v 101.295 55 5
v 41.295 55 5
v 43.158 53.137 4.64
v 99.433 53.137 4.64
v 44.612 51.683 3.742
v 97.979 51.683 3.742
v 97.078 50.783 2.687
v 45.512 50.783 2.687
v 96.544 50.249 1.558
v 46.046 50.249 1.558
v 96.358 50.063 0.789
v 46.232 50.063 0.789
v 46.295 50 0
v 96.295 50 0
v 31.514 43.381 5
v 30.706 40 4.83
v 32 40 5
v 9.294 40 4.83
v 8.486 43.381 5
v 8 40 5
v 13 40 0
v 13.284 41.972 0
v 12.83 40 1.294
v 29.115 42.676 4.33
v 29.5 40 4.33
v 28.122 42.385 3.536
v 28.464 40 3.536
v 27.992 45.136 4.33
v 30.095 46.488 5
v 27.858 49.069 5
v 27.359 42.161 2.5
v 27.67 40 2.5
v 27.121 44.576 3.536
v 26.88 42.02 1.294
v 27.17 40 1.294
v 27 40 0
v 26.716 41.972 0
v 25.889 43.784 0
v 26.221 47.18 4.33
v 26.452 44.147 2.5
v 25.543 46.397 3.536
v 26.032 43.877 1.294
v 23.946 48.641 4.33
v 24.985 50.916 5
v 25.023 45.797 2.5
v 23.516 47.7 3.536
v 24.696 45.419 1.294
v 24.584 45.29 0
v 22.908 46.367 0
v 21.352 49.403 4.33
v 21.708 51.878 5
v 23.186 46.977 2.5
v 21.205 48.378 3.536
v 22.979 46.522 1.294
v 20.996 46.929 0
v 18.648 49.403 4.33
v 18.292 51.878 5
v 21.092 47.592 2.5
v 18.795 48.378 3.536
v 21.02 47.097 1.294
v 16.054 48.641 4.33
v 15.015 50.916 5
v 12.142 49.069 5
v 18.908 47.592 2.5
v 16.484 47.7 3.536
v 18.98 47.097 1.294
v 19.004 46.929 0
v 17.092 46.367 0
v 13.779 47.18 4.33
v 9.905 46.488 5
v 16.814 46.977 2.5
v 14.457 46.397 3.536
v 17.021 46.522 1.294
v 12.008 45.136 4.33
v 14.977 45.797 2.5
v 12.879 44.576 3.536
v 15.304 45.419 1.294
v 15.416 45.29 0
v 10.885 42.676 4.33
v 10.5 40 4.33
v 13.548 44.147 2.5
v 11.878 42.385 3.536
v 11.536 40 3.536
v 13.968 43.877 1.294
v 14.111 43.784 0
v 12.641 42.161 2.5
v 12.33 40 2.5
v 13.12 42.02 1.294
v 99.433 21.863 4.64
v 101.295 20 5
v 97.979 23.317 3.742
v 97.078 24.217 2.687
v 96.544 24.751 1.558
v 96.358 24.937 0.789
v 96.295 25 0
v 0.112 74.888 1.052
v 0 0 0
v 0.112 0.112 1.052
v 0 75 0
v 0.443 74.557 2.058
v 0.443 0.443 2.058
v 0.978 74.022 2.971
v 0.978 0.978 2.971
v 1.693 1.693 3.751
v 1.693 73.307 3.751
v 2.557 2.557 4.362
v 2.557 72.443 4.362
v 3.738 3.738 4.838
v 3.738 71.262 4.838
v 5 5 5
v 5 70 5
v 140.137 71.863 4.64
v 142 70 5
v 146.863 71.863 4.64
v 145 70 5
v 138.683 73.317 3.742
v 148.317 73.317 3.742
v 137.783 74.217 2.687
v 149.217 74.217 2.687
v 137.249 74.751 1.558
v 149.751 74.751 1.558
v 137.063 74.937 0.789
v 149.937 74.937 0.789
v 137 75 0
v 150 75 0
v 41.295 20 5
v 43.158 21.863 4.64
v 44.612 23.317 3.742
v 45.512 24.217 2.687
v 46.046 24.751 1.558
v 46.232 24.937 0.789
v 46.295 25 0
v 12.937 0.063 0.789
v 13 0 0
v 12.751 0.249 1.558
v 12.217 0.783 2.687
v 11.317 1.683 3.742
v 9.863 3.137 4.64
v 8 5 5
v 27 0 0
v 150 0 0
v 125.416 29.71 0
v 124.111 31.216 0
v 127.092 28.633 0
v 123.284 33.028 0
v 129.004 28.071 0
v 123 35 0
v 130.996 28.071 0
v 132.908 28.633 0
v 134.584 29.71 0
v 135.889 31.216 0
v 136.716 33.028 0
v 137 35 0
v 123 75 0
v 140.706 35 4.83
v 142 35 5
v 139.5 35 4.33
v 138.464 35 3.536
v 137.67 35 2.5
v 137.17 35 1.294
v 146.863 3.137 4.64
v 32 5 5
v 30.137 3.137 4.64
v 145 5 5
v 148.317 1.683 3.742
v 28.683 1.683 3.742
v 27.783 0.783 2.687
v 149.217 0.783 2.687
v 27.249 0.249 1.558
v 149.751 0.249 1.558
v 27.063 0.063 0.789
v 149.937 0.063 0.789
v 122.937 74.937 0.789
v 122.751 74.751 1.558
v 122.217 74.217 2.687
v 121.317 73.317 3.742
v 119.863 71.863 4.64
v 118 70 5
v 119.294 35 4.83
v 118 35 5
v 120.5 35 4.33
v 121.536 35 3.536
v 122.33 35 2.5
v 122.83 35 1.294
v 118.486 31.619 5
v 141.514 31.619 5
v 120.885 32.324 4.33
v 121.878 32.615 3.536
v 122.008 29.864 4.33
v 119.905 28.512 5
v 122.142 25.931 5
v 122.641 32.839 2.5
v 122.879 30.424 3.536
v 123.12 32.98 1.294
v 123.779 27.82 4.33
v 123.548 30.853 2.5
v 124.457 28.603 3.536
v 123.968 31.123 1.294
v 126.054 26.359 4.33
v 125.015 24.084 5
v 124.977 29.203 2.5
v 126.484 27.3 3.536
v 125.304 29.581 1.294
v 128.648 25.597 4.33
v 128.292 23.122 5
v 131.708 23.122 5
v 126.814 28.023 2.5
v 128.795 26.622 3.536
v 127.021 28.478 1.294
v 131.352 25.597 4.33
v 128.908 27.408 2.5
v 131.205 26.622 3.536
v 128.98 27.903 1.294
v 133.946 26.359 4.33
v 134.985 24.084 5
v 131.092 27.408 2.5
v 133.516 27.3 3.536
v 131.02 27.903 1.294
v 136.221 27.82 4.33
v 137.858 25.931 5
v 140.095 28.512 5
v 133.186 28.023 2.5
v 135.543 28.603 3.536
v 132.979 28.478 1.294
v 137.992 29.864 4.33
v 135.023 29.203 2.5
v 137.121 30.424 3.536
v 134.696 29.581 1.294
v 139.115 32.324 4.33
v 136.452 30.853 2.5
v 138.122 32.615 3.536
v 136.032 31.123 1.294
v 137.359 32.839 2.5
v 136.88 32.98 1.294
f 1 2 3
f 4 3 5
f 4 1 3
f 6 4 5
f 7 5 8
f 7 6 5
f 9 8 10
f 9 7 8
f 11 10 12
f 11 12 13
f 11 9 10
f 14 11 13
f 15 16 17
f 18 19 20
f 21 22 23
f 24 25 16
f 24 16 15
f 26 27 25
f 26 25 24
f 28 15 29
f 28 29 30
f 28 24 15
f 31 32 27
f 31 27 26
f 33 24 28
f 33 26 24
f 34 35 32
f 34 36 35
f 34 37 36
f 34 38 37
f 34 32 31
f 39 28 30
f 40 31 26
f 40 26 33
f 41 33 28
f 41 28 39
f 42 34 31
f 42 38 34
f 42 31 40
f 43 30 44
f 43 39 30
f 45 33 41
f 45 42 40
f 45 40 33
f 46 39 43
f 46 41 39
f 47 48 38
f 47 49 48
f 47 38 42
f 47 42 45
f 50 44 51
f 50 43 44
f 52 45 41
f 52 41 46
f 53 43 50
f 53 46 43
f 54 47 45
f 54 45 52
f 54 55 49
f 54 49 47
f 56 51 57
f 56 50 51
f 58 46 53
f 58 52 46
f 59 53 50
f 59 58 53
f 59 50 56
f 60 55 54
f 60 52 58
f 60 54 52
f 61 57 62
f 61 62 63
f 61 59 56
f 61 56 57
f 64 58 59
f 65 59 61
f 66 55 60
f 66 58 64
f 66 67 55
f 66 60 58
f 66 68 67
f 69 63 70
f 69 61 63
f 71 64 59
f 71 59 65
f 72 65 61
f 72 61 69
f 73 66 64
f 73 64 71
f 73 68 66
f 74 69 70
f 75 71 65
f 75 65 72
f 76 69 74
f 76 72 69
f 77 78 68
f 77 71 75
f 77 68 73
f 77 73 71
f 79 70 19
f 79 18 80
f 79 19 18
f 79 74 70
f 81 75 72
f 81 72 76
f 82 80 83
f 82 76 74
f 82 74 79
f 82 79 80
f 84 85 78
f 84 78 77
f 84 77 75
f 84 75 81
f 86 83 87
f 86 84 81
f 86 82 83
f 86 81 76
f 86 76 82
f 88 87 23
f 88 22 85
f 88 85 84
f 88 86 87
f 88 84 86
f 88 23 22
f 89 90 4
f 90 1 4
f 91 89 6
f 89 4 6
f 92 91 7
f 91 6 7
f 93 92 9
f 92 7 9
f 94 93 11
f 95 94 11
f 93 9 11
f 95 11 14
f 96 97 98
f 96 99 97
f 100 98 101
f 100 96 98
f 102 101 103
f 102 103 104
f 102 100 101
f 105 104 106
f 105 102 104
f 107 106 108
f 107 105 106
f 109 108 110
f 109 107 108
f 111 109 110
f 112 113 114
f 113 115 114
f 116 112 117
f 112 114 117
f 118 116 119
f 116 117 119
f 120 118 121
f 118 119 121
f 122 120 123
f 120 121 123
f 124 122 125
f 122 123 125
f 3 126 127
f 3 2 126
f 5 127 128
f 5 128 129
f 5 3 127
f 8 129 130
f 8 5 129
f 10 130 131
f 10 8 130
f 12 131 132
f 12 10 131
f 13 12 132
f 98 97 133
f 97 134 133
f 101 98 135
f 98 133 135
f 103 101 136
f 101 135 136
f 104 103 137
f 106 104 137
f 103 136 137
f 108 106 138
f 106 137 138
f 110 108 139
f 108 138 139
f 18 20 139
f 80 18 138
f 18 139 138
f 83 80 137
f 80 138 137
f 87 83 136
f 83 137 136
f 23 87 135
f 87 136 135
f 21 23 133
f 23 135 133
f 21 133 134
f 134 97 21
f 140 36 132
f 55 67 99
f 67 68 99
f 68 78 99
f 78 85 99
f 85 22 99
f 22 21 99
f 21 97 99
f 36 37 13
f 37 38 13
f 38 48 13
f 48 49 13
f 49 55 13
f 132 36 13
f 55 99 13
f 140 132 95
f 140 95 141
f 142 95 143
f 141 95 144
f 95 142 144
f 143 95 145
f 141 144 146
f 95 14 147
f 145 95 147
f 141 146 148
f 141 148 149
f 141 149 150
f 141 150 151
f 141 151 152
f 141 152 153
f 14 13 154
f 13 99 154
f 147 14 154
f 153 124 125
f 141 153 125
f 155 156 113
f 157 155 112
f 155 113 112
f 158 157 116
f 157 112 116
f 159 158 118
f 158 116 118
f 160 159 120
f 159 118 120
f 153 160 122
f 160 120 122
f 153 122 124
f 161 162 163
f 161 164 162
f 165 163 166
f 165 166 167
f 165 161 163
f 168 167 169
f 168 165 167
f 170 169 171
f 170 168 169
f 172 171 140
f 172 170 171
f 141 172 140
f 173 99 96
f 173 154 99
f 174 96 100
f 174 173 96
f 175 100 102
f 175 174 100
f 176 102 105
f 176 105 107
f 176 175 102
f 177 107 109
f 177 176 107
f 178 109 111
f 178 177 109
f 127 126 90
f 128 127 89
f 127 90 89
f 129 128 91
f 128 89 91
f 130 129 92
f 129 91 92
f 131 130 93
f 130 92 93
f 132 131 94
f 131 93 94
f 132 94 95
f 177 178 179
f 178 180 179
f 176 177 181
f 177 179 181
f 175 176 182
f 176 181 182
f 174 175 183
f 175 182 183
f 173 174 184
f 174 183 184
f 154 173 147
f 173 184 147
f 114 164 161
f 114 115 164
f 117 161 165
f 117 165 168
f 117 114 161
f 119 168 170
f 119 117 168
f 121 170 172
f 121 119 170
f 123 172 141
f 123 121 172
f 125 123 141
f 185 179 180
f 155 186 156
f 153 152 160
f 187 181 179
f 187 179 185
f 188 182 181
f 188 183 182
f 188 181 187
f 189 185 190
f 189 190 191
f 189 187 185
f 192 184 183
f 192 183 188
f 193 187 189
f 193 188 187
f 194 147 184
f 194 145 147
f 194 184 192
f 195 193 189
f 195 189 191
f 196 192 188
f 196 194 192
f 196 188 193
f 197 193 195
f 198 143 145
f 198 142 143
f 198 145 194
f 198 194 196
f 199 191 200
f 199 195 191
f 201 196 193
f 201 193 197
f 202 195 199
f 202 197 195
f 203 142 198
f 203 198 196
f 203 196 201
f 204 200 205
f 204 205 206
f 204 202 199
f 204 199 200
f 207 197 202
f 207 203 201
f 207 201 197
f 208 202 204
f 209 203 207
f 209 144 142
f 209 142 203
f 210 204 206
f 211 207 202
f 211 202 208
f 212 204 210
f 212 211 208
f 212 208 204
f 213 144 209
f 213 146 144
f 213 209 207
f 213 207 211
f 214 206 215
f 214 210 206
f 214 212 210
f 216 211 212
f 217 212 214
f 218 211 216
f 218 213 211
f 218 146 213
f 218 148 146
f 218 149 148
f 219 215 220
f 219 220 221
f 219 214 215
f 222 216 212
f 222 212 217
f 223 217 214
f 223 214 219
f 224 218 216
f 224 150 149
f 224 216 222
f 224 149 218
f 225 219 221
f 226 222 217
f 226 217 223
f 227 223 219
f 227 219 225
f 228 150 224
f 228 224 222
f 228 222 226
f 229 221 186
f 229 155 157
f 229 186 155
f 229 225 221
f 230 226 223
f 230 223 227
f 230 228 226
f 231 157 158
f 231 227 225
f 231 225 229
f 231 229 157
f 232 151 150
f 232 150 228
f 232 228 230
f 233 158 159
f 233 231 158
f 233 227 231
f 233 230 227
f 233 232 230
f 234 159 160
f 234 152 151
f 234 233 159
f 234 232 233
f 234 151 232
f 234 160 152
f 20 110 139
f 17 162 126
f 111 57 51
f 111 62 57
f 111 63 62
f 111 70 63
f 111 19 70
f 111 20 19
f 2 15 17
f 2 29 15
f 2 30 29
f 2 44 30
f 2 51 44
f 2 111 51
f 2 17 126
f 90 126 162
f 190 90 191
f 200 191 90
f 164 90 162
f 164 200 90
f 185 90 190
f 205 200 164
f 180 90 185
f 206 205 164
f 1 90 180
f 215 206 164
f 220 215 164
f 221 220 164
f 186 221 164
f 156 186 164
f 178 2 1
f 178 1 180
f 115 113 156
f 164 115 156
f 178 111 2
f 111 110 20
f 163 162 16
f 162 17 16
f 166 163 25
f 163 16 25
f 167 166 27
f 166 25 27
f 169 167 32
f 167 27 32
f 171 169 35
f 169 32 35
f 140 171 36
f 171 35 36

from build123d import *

# Parameters (mm, degrees)
F0_W     = 150
F0_H     = 75
F1_DEPTH = 5
F3_DEPTH = 5.001
F5_DEPTH = 5.001
F6_W     = 50
F6_H     = 25
F7_DEPTH = 5.001
F8_R     = 4.99999


# Not quite as in the source:
# - a fillet or chamfer is up to 0.001 mm smaller than in the source, because OpenCascade refuses the exact size


with BuildPart() as f1:
    # F0 (on Top) → F1 (new body)
    with BuildSketch(Plane.XY):
        with Locations((75, 37.5)):
            Rectangle(F0_W, F0_H)
    extrude(amount=F1_DEPTH)

    # F2 (on face) → F3 (cut, through all)
    with BuildSketch(Plane.XY.offset(5)):
        with BuildLine():
            Line((13, 40), (13, 0))
            Line((13, 0), (27, 0))
            Line((27, 0), (27, 40))
            ThreePointArc((27, 40), (20, 47), (13, 40))
        make_face()
    extrude(amount=-F3_DEPTH, mode=Mode.SUBTRACT)

    # F4 (on face) → F5 (cut, through all)
    with BuildSketch(Plane.XY.offset(5)):
        with BuildLine():
            Line((137, 35), (137, 75))
            Line((137, 75), (123, 75))
            Line((123, 75), (123, 35))
            ThreePointArc((123, 35), (130, 28), (137, 35))
        make_face()
    extrude(amount=-F5_DEPTH, mode=Mode.SUBTRACT)

    # F6 (on face) → F7 (cut, through all)
    with BuildSketch(Plane.XY.offset(5)):
        with Locations((71.2950700867, 37.5)):
            Rectangle(F6_W, F6_H)
    extrude(amount=-F7_DEPTH, mode=Mode.SUBTRACT)

    # F8 (radius 5 in the source; OpenCascade refuses exactly that, so slightly less here)
    f8_edges = [f1.edges().sort_by_distance(p)[0] for p in [
        (88.5, 0, 5),
        (27, 20, 5),
        (150, 37.5, 5),
        (20, 47, 5),
        (143.5, 75, 5),
        (13, 20, 5),
        (137, 55, 5),
        (6.5, 0, 5),
        (130, 28, 5),
        (0, 37.5, 5),
        (123, 55, 5),
        (61.5, 75, 5),
        (71.29507, 50, 5),
        (46.29507, 37.5, 5),
        (71.29507, 25, 5),
        (96.29507, 37.5, 5),
    ]]
    fillet(f8_edges, radius=F8_R)


solid = f1.part
